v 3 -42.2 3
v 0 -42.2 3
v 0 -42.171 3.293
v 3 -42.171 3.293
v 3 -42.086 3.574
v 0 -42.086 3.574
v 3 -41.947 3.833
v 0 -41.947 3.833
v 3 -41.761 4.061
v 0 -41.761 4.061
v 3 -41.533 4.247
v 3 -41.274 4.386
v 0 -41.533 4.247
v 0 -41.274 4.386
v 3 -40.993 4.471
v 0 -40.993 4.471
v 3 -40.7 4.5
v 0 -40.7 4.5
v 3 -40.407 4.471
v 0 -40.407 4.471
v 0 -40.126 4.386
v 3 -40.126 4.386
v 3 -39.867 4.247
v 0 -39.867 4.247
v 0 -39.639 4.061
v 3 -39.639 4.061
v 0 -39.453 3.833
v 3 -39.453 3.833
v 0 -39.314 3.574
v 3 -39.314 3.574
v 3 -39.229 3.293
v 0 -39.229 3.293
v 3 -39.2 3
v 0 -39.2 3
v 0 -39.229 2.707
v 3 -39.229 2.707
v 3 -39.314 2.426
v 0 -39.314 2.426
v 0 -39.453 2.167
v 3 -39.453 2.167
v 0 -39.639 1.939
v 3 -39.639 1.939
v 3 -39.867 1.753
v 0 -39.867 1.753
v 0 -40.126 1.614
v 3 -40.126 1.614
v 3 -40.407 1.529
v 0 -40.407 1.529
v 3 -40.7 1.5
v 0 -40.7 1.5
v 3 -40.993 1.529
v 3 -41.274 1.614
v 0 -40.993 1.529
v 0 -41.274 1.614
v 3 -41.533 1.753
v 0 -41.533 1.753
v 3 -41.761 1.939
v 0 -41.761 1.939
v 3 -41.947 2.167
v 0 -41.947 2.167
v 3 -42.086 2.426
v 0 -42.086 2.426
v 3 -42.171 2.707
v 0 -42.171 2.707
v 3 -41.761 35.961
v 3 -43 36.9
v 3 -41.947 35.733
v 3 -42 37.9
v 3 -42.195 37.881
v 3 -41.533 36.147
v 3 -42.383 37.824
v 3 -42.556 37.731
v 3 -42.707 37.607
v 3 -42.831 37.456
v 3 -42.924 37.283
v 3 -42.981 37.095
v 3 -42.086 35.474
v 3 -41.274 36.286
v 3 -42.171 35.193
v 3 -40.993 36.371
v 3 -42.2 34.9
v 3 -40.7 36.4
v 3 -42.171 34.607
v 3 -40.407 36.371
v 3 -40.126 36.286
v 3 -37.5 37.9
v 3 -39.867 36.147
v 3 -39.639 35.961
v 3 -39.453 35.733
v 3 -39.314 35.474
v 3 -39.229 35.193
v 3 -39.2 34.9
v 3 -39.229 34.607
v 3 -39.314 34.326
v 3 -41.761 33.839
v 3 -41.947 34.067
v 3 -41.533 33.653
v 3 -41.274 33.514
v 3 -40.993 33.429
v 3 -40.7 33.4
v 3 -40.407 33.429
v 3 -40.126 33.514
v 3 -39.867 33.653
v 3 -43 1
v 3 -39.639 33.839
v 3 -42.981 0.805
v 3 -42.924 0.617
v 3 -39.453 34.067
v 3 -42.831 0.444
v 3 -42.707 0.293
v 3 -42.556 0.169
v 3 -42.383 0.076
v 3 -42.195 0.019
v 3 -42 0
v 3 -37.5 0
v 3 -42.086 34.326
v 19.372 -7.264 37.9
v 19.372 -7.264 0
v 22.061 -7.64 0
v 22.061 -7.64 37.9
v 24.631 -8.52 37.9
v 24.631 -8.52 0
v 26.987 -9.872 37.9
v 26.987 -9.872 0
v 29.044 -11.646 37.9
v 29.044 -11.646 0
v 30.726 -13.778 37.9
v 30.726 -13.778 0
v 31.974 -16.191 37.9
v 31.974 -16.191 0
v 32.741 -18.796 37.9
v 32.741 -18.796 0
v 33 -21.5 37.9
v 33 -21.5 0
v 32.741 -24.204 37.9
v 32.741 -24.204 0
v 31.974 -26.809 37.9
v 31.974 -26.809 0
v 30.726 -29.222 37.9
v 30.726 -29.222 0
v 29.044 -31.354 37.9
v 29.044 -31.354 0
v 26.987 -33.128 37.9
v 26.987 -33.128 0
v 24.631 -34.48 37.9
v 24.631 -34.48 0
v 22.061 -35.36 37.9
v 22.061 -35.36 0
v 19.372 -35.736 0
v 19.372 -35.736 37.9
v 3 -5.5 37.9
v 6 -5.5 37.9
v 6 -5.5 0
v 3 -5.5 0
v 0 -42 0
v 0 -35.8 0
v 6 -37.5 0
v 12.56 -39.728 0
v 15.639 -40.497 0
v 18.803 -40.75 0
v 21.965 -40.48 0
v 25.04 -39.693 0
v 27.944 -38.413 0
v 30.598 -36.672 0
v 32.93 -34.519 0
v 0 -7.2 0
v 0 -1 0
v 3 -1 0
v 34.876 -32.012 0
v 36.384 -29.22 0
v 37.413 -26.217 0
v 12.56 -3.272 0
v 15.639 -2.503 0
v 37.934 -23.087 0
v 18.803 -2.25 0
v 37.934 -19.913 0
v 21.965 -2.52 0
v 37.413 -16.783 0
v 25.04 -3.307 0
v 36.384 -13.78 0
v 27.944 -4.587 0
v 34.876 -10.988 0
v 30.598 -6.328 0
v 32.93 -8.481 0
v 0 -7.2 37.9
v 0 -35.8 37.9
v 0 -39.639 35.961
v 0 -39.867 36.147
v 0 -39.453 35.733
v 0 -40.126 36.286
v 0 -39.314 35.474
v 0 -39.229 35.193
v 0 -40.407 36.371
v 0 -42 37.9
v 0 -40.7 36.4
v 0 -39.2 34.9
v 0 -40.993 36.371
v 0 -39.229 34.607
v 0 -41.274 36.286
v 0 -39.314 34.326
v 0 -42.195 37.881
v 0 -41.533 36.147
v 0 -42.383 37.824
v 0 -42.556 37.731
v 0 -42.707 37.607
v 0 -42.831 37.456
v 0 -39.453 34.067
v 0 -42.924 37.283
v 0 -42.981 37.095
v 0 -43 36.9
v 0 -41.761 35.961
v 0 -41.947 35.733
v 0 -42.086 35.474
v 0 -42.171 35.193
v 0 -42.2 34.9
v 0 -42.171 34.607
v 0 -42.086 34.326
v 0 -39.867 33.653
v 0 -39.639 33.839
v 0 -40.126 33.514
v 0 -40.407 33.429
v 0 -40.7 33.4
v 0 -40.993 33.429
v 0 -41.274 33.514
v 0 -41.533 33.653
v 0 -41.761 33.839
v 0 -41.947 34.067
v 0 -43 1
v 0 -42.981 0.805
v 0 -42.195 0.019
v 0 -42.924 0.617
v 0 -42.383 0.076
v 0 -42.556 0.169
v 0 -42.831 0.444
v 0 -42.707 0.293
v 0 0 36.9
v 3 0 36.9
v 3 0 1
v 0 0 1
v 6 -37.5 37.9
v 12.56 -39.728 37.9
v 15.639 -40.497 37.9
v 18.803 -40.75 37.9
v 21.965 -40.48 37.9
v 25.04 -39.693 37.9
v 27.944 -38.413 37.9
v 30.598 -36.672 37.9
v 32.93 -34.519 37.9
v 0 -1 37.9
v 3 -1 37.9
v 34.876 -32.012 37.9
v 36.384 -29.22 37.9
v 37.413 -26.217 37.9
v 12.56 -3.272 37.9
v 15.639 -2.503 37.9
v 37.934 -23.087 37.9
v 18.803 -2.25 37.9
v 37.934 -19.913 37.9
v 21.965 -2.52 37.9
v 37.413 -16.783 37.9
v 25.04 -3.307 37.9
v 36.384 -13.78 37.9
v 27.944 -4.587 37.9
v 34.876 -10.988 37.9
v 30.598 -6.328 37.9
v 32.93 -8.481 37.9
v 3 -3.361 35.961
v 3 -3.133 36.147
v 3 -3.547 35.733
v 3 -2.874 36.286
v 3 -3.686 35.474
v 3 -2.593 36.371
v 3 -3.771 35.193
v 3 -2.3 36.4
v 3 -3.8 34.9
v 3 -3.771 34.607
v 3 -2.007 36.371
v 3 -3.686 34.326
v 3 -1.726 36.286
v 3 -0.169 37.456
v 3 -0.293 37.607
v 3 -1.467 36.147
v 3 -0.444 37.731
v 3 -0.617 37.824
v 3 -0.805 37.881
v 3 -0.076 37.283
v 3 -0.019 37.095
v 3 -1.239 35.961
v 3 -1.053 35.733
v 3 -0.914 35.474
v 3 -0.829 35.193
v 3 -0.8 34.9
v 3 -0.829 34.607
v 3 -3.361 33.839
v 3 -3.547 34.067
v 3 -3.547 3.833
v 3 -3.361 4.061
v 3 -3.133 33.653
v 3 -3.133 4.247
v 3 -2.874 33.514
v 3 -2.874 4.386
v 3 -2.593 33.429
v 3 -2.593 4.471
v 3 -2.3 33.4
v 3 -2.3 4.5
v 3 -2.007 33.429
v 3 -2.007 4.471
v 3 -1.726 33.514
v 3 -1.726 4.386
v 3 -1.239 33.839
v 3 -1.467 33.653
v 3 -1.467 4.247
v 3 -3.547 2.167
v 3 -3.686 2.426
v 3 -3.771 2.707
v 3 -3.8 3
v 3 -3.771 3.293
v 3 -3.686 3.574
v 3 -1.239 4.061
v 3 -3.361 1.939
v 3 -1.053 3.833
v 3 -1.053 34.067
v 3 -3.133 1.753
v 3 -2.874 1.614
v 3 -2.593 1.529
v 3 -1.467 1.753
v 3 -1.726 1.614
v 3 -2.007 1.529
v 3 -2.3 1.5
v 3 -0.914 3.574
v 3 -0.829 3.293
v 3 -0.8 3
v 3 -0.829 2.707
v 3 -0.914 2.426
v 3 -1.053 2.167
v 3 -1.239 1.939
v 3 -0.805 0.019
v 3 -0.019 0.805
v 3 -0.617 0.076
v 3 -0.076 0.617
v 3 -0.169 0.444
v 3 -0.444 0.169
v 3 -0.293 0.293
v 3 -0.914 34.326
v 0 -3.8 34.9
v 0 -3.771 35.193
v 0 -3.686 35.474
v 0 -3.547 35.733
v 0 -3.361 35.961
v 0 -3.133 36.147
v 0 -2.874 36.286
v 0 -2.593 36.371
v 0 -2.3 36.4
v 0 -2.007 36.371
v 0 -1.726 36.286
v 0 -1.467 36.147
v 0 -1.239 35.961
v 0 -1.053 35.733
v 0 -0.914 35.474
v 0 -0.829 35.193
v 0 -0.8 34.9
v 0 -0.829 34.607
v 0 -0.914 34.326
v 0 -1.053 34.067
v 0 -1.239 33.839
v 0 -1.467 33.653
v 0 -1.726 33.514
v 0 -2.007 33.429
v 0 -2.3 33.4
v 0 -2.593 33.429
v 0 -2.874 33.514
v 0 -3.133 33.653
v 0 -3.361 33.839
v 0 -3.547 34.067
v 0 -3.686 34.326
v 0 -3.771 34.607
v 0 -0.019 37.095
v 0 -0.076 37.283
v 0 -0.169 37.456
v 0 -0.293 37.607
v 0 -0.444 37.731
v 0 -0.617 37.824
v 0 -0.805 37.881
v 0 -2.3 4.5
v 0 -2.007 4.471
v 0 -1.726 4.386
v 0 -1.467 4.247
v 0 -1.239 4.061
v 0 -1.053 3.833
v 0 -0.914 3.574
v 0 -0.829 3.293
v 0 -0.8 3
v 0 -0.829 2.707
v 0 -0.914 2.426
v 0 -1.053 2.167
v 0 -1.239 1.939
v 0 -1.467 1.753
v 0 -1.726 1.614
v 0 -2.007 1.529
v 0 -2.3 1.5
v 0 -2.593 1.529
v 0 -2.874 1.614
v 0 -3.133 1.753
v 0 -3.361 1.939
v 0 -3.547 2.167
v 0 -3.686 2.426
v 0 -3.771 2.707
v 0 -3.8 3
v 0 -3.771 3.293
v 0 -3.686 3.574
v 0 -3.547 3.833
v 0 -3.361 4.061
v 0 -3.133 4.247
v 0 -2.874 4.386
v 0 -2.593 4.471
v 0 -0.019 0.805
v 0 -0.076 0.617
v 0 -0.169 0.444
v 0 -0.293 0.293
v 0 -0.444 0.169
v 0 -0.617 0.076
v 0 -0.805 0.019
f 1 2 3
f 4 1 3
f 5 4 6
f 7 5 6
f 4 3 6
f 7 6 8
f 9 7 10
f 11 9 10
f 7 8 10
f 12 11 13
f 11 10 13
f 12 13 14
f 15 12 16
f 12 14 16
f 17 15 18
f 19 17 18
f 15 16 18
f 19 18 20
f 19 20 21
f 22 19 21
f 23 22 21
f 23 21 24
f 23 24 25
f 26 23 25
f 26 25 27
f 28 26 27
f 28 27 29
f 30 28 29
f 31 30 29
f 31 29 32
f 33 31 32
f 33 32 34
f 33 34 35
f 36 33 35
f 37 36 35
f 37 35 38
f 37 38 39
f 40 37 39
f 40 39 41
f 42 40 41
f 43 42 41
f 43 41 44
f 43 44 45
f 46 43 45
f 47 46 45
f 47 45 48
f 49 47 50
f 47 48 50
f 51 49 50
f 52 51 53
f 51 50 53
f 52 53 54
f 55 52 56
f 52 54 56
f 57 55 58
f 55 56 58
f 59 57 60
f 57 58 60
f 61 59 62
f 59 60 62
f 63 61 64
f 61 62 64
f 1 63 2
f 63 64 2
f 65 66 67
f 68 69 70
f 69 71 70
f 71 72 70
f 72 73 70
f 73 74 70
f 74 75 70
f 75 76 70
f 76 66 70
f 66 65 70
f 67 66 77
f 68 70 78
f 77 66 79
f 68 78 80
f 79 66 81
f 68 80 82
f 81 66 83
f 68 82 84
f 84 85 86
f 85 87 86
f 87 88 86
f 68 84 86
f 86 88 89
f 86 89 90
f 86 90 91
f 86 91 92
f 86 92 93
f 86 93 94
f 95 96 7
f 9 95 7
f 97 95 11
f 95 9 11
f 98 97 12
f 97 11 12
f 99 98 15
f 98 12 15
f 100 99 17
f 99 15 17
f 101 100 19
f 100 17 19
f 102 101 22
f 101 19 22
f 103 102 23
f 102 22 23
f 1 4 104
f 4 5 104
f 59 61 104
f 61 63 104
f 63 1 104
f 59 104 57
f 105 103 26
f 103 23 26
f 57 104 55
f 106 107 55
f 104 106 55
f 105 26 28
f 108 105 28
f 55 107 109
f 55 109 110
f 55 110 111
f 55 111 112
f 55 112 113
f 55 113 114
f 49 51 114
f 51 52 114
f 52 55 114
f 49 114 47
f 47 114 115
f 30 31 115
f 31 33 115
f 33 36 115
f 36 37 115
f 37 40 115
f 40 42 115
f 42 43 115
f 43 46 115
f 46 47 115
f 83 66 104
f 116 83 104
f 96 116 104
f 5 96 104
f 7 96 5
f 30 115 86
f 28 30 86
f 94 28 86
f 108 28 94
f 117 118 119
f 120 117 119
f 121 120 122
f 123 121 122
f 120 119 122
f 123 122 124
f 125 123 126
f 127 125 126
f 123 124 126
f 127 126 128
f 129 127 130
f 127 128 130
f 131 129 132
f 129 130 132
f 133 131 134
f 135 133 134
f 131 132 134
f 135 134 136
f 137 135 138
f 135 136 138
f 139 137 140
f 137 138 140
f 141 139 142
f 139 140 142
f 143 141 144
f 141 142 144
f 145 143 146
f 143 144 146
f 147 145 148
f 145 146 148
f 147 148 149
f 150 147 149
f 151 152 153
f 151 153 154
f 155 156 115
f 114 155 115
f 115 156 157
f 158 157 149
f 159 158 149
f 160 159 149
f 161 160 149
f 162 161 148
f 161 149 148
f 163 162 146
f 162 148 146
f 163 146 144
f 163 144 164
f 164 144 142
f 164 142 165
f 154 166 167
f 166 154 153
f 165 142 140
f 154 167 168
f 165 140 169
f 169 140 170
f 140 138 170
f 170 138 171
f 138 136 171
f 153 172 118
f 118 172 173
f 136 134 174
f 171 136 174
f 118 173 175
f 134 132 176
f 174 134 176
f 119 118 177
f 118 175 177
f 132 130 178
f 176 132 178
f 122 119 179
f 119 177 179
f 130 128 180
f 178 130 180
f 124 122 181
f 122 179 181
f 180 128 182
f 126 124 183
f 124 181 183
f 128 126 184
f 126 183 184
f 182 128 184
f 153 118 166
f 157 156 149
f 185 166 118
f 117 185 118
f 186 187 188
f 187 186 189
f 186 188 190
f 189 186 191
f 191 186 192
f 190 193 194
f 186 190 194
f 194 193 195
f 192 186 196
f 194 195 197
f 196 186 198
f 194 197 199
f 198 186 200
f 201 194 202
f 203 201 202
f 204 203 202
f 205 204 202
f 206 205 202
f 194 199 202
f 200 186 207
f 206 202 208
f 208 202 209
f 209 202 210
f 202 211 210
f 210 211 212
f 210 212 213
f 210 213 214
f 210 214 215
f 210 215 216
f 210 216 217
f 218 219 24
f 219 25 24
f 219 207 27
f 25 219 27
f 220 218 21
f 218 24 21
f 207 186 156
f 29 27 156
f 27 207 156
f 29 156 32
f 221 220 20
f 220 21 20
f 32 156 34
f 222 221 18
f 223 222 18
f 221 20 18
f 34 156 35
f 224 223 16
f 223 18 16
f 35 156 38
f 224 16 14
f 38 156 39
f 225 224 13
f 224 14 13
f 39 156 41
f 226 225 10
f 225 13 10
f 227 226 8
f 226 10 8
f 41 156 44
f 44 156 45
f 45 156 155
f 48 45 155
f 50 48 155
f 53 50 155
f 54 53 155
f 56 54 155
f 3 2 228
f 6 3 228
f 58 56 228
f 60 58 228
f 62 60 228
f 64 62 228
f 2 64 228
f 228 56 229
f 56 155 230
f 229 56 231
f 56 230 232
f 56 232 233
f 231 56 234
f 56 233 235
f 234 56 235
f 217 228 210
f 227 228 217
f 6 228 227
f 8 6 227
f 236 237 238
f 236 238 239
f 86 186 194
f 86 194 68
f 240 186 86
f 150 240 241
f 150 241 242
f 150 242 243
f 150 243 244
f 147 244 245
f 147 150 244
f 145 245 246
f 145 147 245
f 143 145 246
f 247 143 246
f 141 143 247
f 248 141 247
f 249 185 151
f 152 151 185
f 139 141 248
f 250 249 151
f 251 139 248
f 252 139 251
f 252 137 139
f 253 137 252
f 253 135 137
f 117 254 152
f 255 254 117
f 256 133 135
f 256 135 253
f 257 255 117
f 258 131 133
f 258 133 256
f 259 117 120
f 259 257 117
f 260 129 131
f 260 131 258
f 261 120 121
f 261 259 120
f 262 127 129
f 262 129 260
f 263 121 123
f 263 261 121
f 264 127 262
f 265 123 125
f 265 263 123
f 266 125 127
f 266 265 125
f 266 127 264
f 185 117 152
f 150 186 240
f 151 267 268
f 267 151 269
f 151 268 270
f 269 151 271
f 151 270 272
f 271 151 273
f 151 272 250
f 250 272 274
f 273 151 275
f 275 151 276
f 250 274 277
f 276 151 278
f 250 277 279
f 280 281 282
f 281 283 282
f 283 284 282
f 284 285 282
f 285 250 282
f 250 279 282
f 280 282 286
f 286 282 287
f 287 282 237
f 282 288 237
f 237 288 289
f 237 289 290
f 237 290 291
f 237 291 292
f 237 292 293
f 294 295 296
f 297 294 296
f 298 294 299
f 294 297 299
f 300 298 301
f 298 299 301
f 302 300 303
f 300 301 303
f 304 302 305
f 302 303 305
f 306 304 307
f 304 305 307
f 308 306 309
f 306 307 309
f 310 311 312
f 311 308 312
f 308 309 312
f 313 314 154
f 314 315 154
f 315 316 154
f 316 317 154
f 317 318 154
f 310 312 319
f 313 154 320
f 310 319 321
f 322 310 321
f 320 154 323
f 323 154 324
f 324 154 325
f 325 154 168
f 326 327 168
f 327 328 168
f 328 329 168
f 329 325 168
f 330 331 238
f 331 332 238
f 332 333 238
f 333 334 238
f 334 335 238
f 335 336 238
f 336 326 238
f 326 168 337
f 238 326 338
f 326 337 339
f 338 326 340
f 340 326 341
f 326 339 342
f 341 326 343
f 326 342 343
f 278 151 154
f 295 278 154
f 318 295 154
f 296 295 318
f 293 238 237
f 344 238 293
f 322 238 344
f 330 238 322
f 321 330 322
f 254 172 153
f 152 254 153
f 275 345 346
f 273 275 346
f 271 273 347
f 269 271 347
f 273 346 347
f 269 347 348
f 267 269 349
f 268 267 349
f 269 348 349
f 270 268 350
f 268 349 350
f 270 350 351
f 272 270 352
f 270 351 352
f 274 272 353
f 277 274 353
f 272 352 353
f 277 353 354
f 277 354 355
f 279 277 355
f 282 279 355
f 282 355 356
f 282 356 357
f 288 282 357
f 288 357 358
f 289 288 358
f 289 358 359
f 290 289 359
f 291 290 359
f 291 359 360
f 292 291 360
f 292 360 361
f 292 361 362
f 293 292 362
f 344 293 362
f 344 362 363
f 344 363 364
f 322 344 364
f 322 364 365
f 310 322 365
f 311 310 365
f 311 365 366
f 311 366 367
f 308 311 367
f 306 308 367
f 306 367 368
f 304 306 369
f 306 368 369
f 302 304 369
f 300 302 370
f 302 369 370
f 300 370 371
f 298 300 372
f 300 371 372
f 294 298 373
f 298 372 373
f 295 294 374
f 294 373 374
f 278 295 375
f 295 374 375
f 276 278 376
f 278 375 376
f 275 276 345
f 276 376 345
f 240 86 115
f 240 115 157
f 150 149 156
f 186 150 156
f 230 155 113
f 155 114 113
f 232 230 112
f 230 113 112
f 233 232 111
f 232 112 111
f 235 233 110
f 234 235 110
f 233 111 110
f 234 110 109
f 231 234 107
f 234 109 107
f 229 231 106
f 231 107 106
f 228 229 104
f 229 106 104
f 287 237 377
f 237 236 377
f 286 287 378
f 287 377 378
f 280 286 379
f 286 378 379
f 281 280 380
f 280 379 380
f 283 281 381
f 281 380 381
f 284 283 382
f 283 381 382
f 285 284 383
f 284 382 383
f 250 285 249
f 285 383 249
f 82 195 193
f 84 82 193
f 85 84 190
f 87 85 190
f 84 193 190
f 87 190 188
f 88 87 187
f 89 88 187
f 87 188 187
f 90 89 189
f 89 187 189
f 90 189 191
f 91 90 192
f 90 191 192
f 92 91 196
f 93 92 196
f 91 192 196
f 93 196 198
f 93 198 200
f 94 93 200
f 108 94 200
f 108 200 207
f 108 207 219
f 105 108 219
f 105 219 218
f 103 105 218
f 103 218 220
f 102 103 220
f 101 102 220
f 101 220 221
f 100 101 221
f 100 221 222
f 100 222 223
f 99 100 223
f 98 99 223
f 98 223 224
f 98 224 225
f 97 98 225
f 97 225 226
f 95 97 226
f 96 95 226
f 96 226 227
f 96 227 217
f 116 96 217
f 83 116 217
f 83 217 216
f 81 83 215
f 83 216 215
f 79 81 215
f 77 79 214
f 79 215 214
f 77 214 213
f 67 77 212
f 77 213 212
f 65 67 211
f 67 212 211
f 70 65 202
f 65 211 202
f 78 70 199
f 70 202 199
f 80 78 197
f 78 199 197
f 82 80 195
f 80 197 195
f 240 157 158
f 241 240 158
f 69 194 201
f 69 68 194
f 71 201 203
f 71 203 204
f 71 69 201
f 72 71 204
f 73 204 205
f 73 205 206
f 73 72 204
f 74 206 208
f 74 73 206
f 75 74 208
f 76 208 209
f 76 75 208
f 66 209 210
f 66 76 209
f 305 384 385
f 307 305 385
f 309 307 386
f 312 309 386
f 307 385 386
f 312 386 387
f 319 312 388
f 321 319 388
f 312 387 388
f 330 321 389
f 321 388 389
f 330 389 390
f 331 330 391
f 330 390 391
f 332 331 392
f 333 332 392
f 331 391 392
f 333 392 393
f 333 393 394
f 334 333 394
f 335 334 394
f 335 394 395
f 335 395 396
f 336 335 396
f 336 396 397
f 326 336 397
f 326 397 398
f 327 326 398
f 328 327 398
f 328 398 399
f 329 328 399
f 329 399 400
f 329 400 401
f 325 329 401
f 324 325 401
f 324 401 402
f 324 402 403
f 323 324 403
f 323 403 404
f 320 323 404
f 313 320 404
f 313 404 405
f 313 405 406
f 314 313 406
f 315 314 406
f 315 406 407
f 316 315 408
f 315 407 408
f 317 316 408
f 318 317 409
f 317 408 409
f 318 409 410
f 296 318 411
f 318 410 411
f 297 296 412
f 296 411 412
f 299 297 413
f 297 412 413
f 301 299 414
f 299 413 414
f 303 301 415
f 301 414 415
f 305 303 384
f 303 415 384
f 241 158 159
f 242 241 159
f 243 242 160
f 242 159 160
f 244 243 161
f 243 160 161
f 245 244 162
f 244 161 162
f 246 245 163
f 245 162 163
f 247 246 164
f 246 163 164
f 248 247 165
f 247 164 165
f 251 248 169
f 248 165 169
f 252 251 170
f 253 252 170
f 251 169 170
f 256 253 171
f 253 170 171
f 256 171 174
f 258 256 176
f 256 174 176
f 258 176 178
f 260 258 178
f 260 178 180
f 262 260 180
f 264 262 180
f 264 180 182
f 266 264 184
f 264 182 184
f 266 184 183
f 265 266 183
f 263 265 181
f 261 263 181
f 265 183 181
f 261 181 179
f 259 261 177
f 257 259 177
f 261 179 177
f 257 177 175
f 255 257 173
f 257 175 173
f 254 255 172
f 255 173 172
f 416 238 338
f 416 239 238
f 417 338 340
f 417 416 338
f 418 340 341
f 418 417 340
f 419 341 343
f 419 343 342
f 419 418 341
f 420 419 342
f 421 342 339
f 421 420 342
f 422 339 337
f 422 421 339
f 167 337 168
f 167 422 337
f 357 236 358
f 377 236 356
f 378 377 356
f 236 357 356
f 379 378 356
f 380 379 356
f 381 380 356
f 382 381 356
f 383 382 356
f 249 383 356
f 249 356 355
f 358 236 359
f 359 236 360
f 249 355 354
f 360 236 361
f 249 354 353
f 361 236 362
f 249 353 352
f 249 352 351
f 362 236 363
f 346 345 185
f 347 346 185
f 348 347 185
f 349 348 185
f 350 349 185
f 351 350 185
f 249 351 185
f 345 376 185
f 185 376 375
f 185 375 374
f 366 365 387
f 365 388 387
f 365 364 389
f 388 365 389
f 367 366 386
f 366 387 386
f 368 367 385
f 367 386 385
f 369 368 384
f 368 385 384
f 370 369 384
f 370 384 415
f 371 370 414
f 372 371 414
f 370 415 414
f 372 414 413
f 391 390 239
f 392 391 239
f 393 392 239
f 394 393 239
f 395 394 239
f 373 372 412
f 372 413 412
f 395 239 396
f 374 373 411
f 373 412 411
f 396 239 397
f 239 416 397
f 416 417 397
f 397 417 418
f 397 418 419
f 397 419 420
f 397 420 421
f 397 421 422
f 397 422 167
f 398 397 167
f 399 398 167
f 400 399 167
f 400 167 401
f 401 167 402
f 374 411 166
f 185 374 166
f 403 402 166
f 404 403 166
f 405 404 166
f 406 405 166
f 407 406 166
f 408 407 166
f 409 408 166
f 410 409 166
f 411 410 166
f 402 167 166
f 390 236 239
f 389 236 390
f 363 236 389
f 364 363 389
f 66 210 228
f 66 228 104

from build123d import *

# Parameters (mm, degrees)
EXTRUDE_1_DEPTH     = 37.9
CUT_EXTRUDE_1_REACH = 70.771
SKETCH_2_R          = 1.5
FILLET_1_R          = 1


with BuildPart() as part:
    # 草图1 → 凸台-拉伸1 (new body)
    with BuildSketch(Plane.XY):
        with BuildLine():
            Line((0, 0), (0, -7.2))
            Line((0, -7.2), (19.37157627, -7.263562842))
            ThreePointArc((19.37157627, -7.263562842), (33, -21.5), (19.37157627, -35.736437158))
            Line((19.37157627, -35.736437158), (0, -35.8))
            Line((0, -35.8), (0, -43))
            Line((0, -43), (3, -43))
            Line((3, -43), (3, -37.5))
            Line((3, -37.5), (6, -37.5))
            Line((6, -37.5), (12.56027856, -39.727721978))
            ThreePointArc((12.56027856, -39.727721978), (38, -21.5), (12.56027856, -3.272278022))
            Line((12.56027856, -3.272278022), (6, -5.5))
            Line((6, -5.5), (3, -5.5))
            Line((3, -5.5), (3, 0))
            Line((3, 0), (0, 0))
        make_face()
    extrude(amount=EXTRUDE_1_DEPTH)

    # 草图2 → 切除-拉伸1 (cut, up to next)
    with BuildSketch(Plane.ZY, mode=Mode.PRIVATE) as cut_extrude_1_sk1:
        with Locations((3, -2.3)):
            Circle(SKETCH_2_R)
    cut_extrude_1_tool1 = extrude(cut_extrude_1_sk1.sketch, amount=-CUT_EXTRUDE_1_REACH, mode=Mode.PRIVATE) & part.part
    # 草图2 → 切除-拉伸1 (cut, up to next)
    with BuildSketch(Plane.ZY, mode=Mode.PRIVATE) as cut_extrude_1_sk2:
        with Locations(Location((34.9, -2.3, 0), (0, 0, 270))):
            Circle(SKETCH_2_R)
    cut_extrude_1_tool2 = extrude(cut_extrude_1_sk2.sketch, amount=-CUT_EXTRUDE_1_REACH, mode=Mode.PRIVATE) & part.part
    # 草图2 → 切除-拉伸1 (cut, up to next)
    with BuildSketch(Plane.ZY, mode=Mode.PRIVATE) as cut_extrude_1_sk3:
        with Locations(Location((3, -40.7, 0), (0, 0, 270))):
            Circle(SKETCH_2_R)
    cut_extrude_1_tool3 = extrude(cut_extrude_1_sk3.sketch, amount=-CUT_EXTRUDE_1_REACH, mode=Mode.PRIVATE) & part.part
    # 草图2 → 切除-拉伸1 (cut, up to next)
    with BuildSketch(Plane.ZY, mode=Mode.PRIVATE) as cut_extrude_1_sk4:
        with Locations((34.9, -40.7)):
            Circle(SKETCH_2_R)
    cut_extrude_1_tool4 = extrude(cut_extrude_1_sk4.sketch, amount=-CUT_EXTRUDE_1_REACH, mode=Mode.PRIVATE) & part.part
    add(cut_extrude_1_tool1.solids().sort_by_distance((0, -2.3, 3))[0], mode=Mode.SUBTRACT)
    add(cut_extrude_1_tool2.solids().sort_by_distance((0, -2.3, 34.9))[0], mode=Mode.SUBTRACT)
    add(cut_extrude_1_tool3.solids().sort_by_distance((0, -40.7, 3))[0], mode=Mode.SUBTRACT)
    add(cut_extrude_1_tool4.solids().sort_by_distance((0, -40.7, 34.9))[0], mode=Mode.SUBTRACT)

    # 圆角1
    fillet_1_edges = [part.edges().sort_by_distance(p)[0] for p in [
        (1.5, -43, 0),
        (1.5, 0, 0),
        (1.5, -43, 37.9),
        (1.5, 0, 37.9),
    ]]
    fillet(fillet_1_edges, radius=FILLET_1_R)


solid = part.part
